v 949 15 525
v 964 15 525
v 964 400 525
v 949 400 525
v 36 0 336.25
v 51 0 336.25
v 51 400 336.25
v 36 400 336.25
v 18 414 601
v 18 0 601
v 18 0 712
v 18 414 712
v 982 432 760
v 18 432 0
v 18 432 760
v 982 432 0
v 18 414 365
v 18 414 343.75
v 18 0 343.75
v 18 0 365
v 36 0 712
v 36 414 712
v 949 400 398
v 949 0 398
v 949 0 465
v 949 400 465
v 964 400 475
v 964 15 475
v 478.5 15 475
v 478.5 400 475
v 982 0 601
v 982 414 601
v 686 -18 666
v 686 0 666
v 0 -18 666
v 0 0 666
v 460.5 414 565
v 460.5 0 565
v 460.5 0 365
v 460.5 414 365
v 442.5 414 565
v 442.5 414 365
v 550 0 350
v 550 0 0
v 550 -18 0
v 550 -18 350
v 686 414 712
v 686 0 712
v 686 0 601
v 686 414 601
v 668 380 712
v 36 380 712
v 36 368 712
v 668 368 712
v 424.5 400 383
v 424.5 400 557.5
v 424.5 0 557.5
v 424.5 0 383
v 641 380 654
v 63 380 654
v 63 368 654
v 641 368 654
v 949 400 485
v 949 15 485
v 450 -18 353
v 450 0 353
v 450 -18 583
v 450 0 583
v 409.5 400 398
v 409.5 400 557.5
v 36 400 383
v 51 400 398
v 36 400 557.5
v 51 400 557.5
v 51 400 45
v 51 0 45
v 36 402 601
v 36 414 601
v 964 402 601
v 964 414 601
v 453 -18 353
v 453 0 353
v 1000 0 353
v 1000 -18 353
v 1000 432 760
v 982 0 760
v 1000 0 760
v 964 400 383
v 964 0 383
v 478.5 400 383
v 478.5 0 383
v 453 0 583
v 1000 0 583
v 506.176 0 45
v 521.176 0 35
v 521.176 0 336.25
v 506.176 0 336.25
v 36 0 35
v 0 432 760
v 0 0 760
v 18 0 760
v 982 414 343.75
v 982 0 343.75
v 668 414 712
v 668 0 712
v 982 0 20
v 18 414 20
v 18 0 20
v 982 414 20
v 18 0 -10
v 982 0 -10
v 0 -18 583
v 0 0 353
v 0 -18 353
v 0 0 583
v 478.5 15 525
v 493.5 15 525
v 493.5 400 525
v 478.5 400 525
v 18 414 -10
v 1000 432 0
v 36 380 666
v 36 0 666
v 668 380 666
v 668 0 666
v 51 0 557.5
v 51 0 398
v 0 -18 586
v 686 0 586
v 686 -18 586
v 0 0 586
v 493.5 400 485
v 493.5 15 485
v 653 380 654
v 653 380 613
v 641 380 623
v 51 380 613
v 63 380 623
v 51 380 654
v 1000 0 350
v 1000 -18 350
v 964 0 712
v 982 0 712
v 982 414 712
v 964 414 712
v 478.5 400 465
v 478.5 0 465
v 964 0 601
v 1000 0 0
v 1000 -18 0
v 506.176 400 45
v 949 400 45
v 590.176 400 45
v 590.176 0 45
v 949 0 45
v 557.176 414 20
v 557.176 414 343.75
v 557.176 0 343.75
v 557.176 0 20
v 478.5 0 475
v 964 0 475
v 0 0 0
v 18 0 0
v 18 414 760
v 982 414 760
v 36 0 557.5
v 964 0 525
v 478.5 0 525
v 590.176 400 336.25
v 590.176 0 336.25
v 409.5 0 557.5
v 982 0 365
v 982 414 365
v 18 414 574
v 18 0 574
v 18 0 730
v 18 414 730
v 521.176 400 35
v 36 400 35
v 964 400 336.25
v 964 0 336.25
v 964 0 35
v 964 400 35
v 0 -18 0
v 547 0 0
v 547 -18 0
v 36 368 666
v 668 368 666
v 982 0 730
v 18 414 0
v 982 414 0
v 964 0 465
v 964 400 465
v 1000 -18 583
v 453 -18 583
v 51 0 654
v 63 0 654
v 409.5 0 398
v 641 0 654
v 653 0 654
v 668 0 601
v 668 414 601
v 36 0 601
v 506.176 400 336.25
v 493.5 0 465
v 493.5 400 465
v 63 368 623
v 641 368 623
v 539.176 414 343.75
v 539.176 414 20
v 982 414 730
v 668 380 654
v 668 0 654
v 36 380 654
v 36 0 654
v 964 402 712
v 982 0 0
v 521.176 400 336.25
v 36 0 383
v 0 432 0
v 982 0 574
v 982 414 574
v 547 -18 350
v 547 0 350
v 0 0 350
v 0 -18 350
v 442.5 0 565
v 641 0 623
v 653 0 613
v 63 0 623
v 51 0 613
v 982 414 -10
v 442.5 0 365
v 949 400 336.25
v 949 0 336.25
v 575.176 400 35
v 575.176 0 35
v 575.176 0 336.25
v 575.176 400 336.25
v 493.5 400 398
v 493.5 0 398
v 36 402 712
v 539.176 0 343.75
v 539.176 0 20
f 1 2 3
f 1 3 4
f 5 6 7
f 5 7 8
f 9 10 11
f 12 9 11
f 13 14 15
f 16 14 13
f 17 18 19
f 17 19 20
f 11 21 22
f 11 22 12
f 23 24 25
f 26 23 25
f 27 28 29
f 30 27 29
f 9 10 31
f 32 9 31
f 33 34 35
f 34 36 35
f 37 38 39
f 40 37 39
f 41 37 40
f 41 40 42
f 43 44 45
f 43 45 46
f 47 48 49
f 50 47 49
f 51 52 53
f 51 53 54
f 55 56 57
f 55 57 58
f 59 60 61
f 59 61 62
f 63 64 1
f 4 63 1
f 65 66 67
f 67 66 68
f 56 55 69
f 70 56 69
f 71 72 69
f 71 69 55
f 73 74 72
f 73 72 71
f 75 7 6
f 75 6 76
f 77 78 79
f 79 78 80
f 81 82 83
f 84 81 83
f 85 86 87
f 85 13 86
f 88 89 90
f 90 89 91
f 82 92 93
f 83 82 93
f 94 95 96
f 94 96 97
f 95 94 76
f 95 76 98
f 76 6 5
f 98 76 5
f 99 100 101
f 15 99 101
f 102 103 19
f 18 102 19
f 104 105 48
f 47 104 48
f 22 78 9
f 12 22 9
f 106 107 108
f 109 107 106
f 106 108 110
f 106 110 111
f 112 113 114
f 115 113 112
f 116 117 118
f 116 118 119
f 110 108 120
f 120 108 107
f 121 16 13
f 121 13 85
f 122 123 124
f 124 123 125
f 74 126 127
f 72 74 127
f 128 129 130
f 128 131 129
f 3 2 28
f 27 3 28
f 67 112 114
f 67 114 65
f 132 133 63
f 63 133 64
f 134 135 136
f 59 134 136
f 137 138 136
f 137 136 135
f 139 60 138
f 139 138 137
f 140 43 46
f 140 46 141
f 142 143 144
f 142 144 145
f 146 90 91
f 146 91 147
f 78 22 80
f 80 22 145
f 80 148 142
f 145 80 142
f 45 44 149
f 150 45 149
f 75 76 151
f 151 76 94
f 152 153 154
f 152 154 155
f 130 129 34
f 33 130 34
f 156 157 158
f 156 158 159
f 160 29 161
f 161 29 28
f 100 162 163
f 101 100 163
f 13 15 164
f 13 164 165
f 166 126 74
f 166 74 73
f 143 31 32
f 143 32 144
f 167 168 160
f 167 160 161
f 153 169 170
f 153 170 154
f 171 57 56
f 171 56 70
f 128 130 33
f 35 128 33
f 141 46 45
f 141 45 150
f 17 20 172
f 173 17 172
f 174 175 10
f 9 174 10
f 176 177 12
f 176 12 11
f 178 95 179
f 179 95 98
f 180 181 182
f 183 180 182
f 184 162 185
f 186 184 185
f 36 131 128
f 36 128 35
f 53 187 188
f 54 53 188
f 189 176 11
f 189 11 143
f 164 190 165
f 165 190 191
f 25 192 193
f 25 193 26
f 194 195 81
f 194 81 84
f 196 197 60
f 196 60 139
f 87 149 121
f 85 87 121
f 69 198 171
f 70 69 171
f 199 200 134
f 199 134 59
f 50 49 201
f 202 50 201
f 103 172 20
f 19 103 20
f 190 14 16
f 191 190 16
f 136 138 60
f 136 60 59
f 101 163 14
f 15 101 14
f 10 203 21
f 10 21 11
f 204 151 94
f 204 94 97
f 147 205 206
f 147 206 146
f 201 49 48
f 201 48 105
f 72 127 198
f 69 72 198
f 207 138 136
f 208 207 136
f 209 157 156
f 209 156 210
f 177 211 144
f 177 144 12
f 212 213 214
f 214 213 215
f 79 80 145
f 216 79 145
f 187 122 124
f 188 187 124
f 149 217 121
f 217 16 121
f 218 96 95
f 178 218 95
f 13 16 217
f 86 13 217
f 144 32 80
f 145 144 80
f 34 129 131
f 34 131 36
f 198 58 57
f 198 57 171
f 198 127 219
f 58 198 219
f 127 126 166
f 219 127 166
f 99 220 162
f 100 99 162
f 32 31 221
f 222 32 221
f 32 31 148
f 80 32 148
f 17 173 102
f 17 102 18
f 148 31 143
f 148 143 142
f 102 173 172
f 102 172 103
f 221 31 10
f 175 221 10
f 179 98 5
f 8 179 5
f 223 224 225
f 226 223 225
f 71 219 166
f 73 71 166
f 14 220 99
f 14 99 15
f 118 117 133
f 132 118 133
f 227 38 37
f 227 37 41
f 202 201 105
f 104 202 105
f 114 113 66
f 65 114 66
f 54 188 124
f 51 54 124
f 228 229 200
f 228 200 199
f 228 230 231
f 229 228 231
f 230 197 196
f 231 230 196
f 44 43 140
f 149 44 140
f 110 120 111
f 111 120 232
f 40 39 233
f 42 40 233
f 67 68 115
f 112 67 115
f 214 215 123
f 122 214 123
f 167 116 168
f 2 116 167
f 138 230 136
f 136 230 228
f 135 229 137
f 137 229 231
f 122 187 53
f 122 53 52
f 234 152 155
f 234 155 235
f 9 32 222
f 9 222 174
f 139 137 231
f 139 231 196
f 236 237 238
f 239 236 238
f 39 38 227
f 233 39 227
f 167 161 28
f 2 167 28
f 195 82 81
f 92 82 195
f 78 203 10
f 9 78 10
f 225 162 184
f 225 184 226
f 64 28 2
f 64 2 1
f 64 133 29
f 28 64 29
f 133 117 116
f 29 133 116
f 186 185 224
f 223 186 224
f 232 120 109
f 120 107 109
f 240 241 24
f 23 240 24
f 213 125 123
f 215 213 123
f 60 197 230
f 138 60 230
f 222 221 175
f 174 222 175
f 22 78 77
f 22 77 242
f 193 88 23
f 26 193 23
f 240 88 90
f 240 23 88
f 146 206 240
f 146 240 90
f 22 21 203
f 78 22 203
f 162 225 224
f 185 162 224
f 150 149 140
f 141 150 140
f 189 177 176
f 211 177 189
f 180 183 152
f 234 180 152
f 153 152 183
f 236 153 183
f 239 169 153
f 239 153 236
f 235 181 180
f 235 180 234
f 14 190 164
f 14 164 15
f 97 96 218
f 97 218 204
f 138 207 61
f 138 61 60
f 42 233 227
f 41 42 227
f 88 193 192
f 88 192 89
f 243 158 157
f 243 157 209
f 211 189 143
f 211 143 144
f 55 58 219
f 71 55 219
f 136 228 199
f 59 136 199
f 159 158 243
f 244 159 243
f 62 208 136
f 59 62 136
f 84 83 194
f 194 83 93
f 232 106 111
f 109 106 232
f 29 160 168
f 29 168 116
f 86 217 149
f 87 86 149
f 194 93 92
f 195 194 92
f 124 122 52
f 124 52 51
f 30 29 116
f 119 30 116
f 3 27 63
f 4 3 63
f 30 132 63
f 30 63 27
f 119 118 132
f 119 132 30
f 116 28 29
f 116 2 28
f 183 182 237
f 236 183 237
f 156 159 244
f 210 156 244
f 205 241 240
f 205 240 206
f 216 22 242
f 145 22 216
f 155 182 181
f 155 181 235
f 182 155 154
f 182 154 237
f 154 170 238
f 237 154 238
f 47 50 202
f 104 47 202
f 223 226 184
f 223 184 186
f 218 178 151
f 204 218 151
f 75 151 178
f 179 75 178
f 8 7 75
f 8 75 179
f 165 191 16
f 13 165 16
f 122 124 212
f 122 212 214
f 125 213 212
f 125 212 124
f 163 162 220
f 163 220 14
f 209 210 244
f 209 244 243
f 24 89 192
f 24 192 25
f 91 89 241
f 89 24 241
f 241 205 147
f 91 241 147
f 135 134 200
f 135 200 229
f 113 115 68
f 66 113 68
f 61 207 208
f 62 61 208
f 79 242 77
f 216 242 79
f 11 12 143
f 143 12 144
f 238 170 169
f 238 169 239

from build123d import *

# Parameters (mm, degrees)
F0_W           = 18
F0_H           = 414
F0_H_2         = 18
F1_DEPTH       = 760
F0_W_2         = 964
F2_DEPTH       = 760
F3_DEPTH       = 20
F3_DEPTH_BACK  = 10
F4_W           = 650
F4_H           = 300
F4_H_2         = 114
F5_DEPTH       = 18
F7_W           = 432
F7_H           = 230
F7_W_2         = 18
F8_DEPTH       = 18
F7_W_3         = 300
F7_W_4         = 244
F7_W_5         = 3
F7_W_6         = 450
F7_H_2         = 350
F7_W_7         = 226
F7_W_8         = 650
F7_H_3         = 80
F10_DEPTH      = 414
F9_W           = 278
F9_H           = 18
F9_W_2         = 18
F9_W_3         = 632
F9_H_2         = 15
F9_H_3         = 3
F11_DEPTH      = 414
F9_H_4         = 7.5
F9_H_5         = 159.5
F9_H_6         = 291.25041
F9_H_7         = 10
F9_H_8         = 111
F9_H_9         = 46
F9_H_10        = 65
F12_W          = 928
F12_H          = 111
F13_DEPTH      = 12
F9_W_4         = 15
F9_W_5         = 358.5
F14_DEPTH      = 400
F9_W_6         = 455.5
F9_H_11        = 67
F9_H_12        = 240
F9_W_7         = 358.8239558978
F9_H_13        = 51.25041
F9_W_8         = 455.1760441022
F9_H_14        = 40
F15_W          = 455.5
F15_H          = 15
F15_W_2        = 15
F16_DEPTH      = 40
F16_DEPTH_BACK = 10
F18_W          = 12
F18_H          = 31
F18_H_2        = 10
F18_W_2        = 578
F19_DEPTH      = 380
F20_W          = 578
F20_H          = 12
F21_DEPTH      = 31
F22_DEPTH      = 18
F18_W_3        = 15
F18_H_3        = 12
F23_DEPTH      = 380
F24_W          = 632
F24_H          = 12
F25_DEPTH      = 46


# Not quite as in the source:
# - a feature names something its author has since deleted; it is built from what else it names


with BuildPart() as f1:
    # F0 (on Top) → F1 (new body)
    with BuildSketch(Plane.XY):
        with Locations((9, 207)):
            Rectangle(F0_W, F0_H)
        with Locations((9, 423)):
            Rectangle(F0_W, F0_H_2)
    extrude(amount=F1_DEPTH)


with BuildPart() as f1b:
    # F0 (on Top) → F1, piece 2 (new body)
    with BuildSketch(Plane.XY):
        with Locations((991, 207)):
            Rectangle(F0_W, F0_H)
        with Locations((991, 423)):
            Rectangle(F0_W, F0_H_2)
    extrude(amount=F1_DEPTH)


with BuildPart() as f2:
    # F0 (on Top) → F2 (new body, through all)
    with BuildSketch(Plane.XY):
        with Locations((500, 423)):
            Rectangle(F0_W_2, F0_H_2)
    extrude(amount=F2_DEPTH)


with BuildPart() as f3:
    # F0 (on Top) → F3 (new body, two sides)
    with BuildSketch(Plane.XY) as f3_sk:
        with Locations((500, 207)):
            Rectangle(F0_W_2, F0_H)
    extrude(amount=F3_DEPTH)
    extrude(f3_sk.sketch, amount=-F3_DEPTH_BACK)


with BuildPart() as f5:
    # F4 (on face) → F5 (new body)
    with BuildSketch(Plane.XY.offset(760)):
        Polygon((982, 414), (668, 414), (668, 300), (668, 0), (982, 0), align=None)
        with Locations((343, 150)):
            Rectangle(F4_W, F4_H)
        with Locations((343, 357)):
            Rectangle(F4_W, F4_H_2)
    extrude(amount=-F5_DEPTH)


with BuildPart() as f5_1:
    # F6: moved
    add(f5.part.moved(Location((0, 0, -30))))


with BuildPart() as f8:
    # F7 (on face) → F8 (new body)
    with BuildSketch(Plane.XZ):
        with Locations((234, 468)):
            Rectangle(F7_W, F7_H)
        with Locations((9, 468)):
            Rectangle(F7_W_2, F7_H)
    extrude(amount=F8_DEPTH)


with BuildPart() as f8b:
    # F7 (on face) → F8, piece 2 (new body)
    with BuildSketch(Plane.XZ):
        with Locations((603, 468)):
            Rectangle(F7_W_3, F7_H)
        with Locations((878, 468)):
            Rectangle(F7_W_4, F7_H)
        with Locations((754.5, 468)):
            Rectangle(F7_W_5, F7_H)
    extrude(amount=F8_DEPTH)


with BuildPart() as f8c:
    # F7 (on face) → F8, piece 3 (new body)
    with BuildSketch(Plane.XZ):
        with Locations((775, 175)):
            Rectangle(F7_W_6, F7_H_2)
    extrude(amount=F8_DEPTH)


with BuildPart() as f8d:
    # F7 (on face) → F8, piece 4 (new body)
    with BuildSketch(Plane.XZ):
        with Locations((397, 175)):
            Rectangle(F7_W_3, F7_H_2)
        with Locations((131, 175)):
            Rectangle(F7_W_7, F7_H_2)
        with Locations((9, 175)):
            Rectangle(F7_W_2, F7_H_2)
        with Locations((245.5, 175)):
            Rectangle(F7_W_5, F7_H_2)
    extrude(amount=F8_DEPTH)


with BuildPart() as f8e:
    # F7 (on face) → F8, piece 5 (new body)
    with BuildSketch(Plane.XZ):
        with Locations((343, 626)):
            Rectangle(F7_W_8, F7_H_3)
        with Locations((9, 626)):
            Rectangle(F7_W_2, F7_H_3)
    extrude(amount=F8_DEPTH)

    # F22 (add, through all): a face of the model
    f22_faces = [f8e.faces().sort_by_distance(p)[0] for p in [
        (668, -9, 626),
    ]]
    extrude(f22_faces, amount=F22_DEPTH)


with BuildPart() as f10:
    # F9 (on face) → F10 (new body, through all)
    with BuildSketch(Plane(origin=(0, 0, 0), x_dir=(-1, 0, 0), z_dir=(0, 1, 0))):
        Polygon((-18, 365), (-36, 365), (-51, 365), (-442.5, 365), (-460.5, 365), (-964, 365), (-982, 365), (-982, 343.75041), (-964, 343.75041), (-949, 343.75041), (-590.1760441022, 343.75041), (-575.1760441022, 343.75041), (-557.1760441022, 343.75041), (-539.1760441022, 343.75041), (-521.1760441022, 343.75041), (-506.1760441022, 343.75041), (-51, 343.75041), (-36, 343.75041), (-18, 343.75041), align=None)
    extrude(amount=F10_DEPTH)


with BuildPart() as f10b:
    # F9 (on face) → F10, piece 2 (new body, through all)
    with BuildSketch(Plane(origin=(0, 0, 0), x_dir=(-1, 0, 0), z_dir=(0, 1, 0))):
        Polygon((-18, 574), (-18, 583), (-36, 583), (-668, 583), (-686, 583), (-964, 583), (-982, 583), (-982, 574), (-424.5, 574), (-409.5, 574), align=None)
        with Locations((-825, 592)):
            Rectangle(F9_W, F9_H)
        Polygon((-686, 583), (-668, 583), (-668, 586), (-668, 601), (-686, 601), align=None)
        with Locations((-973, 592)):
            Rectangle(F9_W_2, F9_H)
        with Locations((-352, 593.5)):
            Rectangle(F9_W_3, F9_H_2)
        with Locations((-27, 593.5)):
            Rectangle(F9_W_2, F9_H_2)
        with Locations((-27, 584.5)):
            Rectangle(F9_W_2, F9_H_3)
        with Locations((-352, 584.5)):
            Rectangle(F9_W_3, F9_H_3)
    extrude(amount=F10_DEPTH)


with BuildPart() as f11:
    # F9 (on face) → F11 (new body, through all)
    with BuildSketch(Plane(origin=(0, 0, 0), x_dir=(-1, 0, 0), z_dir=(0, 1, 0))):
        Polygon((-686, 712), (-686, 601), (-668, 601), (-668, 666), (-668, 712), align=None)
    extrude(amount=F11_DEPTH)


with BuildPart() as f11b:
    # F9 (on face) → F11, piece 2 (new body, through all)
    with BuildSketch(Plane(origin=(0, 0, 0), x_dir=(-1, 0, 0), z_dir=(0, 1, 0))):
        with Locations((-451.5, 561.25)):
            Rectangle(F9_W_2, F9_H_4)
        with Locations((-451.5, 477.75)):
            Rectangle(F9_W_2, F9_H_5)
        with Locations((-451.5, 390.5)):
            Rectangle(F9_W_2, F9_H_2)
        with Locations((-451.5, 374)):
            Rectangle(F9_W_2, F9_H)
    extrude(amount=F11_DEPTH)


with BuildPart() as f11c:
    # F9 (on face) → F11, piece 3 (new body, through all)
    with BuildSketch(Plane(origin=(0, 0, 0), x_dir=(-1, 0, 0), z_dir=(0, 1, 0))):
        with Locations((-548.1760441022, 340.00041)):
            Rectangle(F9_W_2, F9_H_4)
        with Locations((-548.1760441022, 190.625205)):
            Rectangle(F9_W_2, F9_H_6)
        with Locations((-548.1760441022, 40)):
            Rectangle(F9_W_2, F9_H_7)
        with Locations((-548.1760441022, 27.5)):
            Rectangle(F9_W_2, F9_H_2)
    extrude(amount=F11_DEPTH)


with BuildPart() as f11d:
    # F9 (on face) → F11, piece 4 (new body, through all)
    with BuildSketch(Plane(origin=(0, 0, 0), x_dir=(-1, 0, 0), z_dir=(0, 1, 0))):
        with Locations((-973, 656.5)):
            Rectangle(F9_W_2, F9_H_8)
    extrude(amount=F11_DEPTH)


with BuildPart() as f11e:
    # F9 (on face) → F11, piece 5 (new body, through all)
    with BuildSketch(Plane(origin=(0, 0, 0), x_dir=(-1, 0, 0), z_dir=(0, 1, 0))):
        with Locations((-27, 689)):
            Rectangle(F9_W_2, F9_H_9)
        with Locations((-27, 633.5)):
            Rectangle(F9_W_2, F9_H_10)
    extrude(amount=F11_DEPTH)


with BuildPart() as f13:
    # F12 (on face) → F13 (new body)
    with BuildSketch(Plane.XZ.offset(-414)):
        with Locations((500, 656.5)):
            Rectangle(F12_W, F12_H)
    extrude(amount=F13_DEPTH)


with BuildPart() as f14:
    # F9 (on face) → F14 (new body)
    with BuildSketch(Plane(origin=(0, 0, 0), x_dir=(-1, 0, 0), z_dir=(0, 1, 0))):
        with Locations((-43.5, 477.75)):
            Rectangle(F9_W_4, F9_H_5)
        with Locations((-43.5, 390.5)):
            Rectangle(F9_W_4, F9_H_2)
        with Locations((-230.25, 390.5)):
            Rectangle(F9_W_5, F9_H_2)
        with Locations((-417, 390.5)):
            Rectangle(F9_W_4, F9_H_2)
        with Locations((-417, 477.75)):
            Rectangle(F9_W_4, F9_H_5)
    extrude(amount=F14_DEPTH)


with BuildPart() as f14b:
    # F9 (on face) → F14, piece 2 (new body)
    with BuildSketch(Plane(origin=(0, 0, 0), x_dir=(-1, 0, 0), z_dir=(0, 1, 0))):
        with Locations((-486, 390.5)):
            Rectangle(F9_W_4, F9_H_2)
        with Locations((-721.25, 390.5)):
            Rectangle(F9_W_6, F9_H_2)
        with Locations((-956.5, 390.5)):
            Rectangle(F9_W_4, F9_H_2)
        with Locations((-956.5, 431.5)):
            Rectangle(F9_W_4, F9_H_11)
        with Locations((-486, 431.5)):
            Rectangle(F9_W_4, F9_H_11)
    extrude(amount=F14_DEPTH)


with BuildPart() as f14c:
    # F9 (on face) → F14, piece 3 (new body)
    with BuildSketch(Plane(origin=(0, 0, 0), x_dir=(-1, 0, 0), z_dir=(0, 1, 0))):
        with Locations((-956.5, 165)):
            Rectangle(F9_W_4, F9_H_12)
        with Locations((-956.5, 40)):
            Rectangle(F9_W_4, F9_H_7)
        with Locations((-769.5880220511, 40)):
            Rectangle(F9_W_7, F9_H_7)
        with Locations((-582.6760441022, 40)):
            Rectangle(F9_W_4, F9_H_7)
        with Locations((-582.6760441022, 165)):
            Rectangle(F9_W_4, F9_H_12)
        with Locations((-582.6760441022, 310.625205)):
            Rectangle(F9_W_4, F9_H_13)
        with Locations((-956.5, 310.625205)):
            Rectangle(F9_W_4, F9_H_13)
    extrude(amount=F14_DEPTH)


with BuildPart() as f14d:
    # F9 (on face) → F14, piece 4 (new body)
    with BuildSketch(Plane(origin=(0, 0, 0), x_dir=(-1, 0, 0), z_dir=(0, 1, 0))):
        with Locations((-513.6760441022, 40)):
            Rectangle(F9_W_4, F9_H_7)
        with Locations((-513.6760441022, 165)):
            Rectangle(F9_W_4, F9_H_12)
        with Locations((-278.5880220511, 40)):
            Rectangle(F9_W_8, F9_H_7)
        with Locations((-43.5, 40)):
            Rectangle(F9_W_4, F9_H_7)
        with Locations((-43.5, 165)):
            Rectangle(F9_W_4, F9_H_12)
        with Locations((-513.6760441022, 310.625205)):
            Rectangle(F9_W_4, F9_H_13)
        with Locations((-43.5, 310.625205)):
            Rectangle(F9_W_4, F9_H_13)
    extrude(amount=F14_DEPTH)


with BuildPart() as f14e:
    # F9 (on face) → F14, piece 5 (new body)
    with BuildSketch(Plane(origin=(0, 0, 0), x_dir=(-1, 0, 0), z_dir=(0, 1, 0))):
        with Locations((-486, 505)):
            Rectangle(F9_W_4, F9_H_14)
        with Locations((-486, 480)):
            Rectangle(F9_W_4, F9_H_7)
        Polygon((-575.1760441022, 485), (-949, 485), (-949, 475), (-575.1760441022, 475), (-493.5, 475), (-493.5, 485), align=None)
        with Locations((-956.5, 480)):
            Rectangle(F9_W_4, F9_H_7)
        with Locations((-956.5, 505)):
            Rectangle(F9_W_4, F9_H_14)
    extrude(amount=F14_DEPTH)


with BuildPart() as f16:
    # F15 (on face) → F16 (new body, two sides)
    with BuildSketch(Plane.XY.offset(485)) as f16_sk:
        with Locations((721.25, 7.5)):
            Rectangle(F15_W, F15_H)
        with Locations((486, 7.5)):
            Rectangle(F15_W_2, F15_H)
        with Locations((956.5, 7.5)):
            Rectangle(F15_W_2, F15_H)
    extrude(amount=F16_DEPTH)
    extrude(f16_sk.sketch, amount=-F16_DEPTH_BACK)


with BuildPart() as f14e_1:
    add(f14e.part)

    # F17: cut F16
    add(f16.part, mode=Mode.SUBTRACT)


with BuildPart() as f19:
    # F18 (on face) → F19 (new body)
    with BuildSketch(Plane(origin=(0, 0, 0), x_dir=(-1, 0, 0), z_dir=(0, 1, 0))):
        with Locations((-57, 638.5)):
            Rectangle(F18_W, F18_H)
        with Locations((-57, 618)):
            Rectangle(F18_W, F18_H_2)
        with Locations((-352, 618)):
            Rectangle(F18_W_2, F18_H_2)
        with Locations((-647, 618)):
            Rectangle(F18_W, F18_H_2)
        with Locations((-647, 638.5)):
            Rectangle(F18_W, F18_H)
    extrude(amount=F19_DEPTH)


with BuildPart() as f21:
    # F20 (on face) → F21 (new body, through all)
    with BuildSketch(Plane.XY.offset(623)):
        with Locations((352, 374)):
            Rectangle(F20_W, F20_H)
    extrude(amount=F21_DEPTH)


with BuildPart() as f23:
    # F18 (on face) → F23 (new body, through all)
    with BuildSketch(Plane(origin=(0, 0, 0), x_dir=(-1, 0, 0), z_dir=(0, 1, 0))):
        Polygon((-51, 654), (-51, 666), (-653, 666), (-653, 654), (-641, 654), (-63, 654), align=None)
        with Locations((-660.5, 660)):
            Rectangle(F18_W_3, F18_H_3)
        with Locations((-43.5, 660)):
            Rectangle(F18_W_3, F18_H_3)
    extrude(amount=F23_DEPTH)


with BuildPart() as f25:
    # F24 (on face) → F25 (new body, through all)
    with BuildSketch(Plane.XY.offset(666)):
        with Locations((352, 374)):
            Rectangle(F24_W, F24_H)
    extrude(amount=F25_DEPTH)


solid = Compound([f1.part, f1b.part, f2.part, f3.part, f5_1.part, f8.part, f8b.part, f8c.part, f8d.part, f8e.part, f10.part, f10b.part, f11.part, f11b.part, f11c.part, f11d.part, f11e.part, f13.part, f14.part, f14b.part, f14c.part, f14d.part, f16.part, f14e_1.part, f19.part, f21.part, f23.part, f25.part])
